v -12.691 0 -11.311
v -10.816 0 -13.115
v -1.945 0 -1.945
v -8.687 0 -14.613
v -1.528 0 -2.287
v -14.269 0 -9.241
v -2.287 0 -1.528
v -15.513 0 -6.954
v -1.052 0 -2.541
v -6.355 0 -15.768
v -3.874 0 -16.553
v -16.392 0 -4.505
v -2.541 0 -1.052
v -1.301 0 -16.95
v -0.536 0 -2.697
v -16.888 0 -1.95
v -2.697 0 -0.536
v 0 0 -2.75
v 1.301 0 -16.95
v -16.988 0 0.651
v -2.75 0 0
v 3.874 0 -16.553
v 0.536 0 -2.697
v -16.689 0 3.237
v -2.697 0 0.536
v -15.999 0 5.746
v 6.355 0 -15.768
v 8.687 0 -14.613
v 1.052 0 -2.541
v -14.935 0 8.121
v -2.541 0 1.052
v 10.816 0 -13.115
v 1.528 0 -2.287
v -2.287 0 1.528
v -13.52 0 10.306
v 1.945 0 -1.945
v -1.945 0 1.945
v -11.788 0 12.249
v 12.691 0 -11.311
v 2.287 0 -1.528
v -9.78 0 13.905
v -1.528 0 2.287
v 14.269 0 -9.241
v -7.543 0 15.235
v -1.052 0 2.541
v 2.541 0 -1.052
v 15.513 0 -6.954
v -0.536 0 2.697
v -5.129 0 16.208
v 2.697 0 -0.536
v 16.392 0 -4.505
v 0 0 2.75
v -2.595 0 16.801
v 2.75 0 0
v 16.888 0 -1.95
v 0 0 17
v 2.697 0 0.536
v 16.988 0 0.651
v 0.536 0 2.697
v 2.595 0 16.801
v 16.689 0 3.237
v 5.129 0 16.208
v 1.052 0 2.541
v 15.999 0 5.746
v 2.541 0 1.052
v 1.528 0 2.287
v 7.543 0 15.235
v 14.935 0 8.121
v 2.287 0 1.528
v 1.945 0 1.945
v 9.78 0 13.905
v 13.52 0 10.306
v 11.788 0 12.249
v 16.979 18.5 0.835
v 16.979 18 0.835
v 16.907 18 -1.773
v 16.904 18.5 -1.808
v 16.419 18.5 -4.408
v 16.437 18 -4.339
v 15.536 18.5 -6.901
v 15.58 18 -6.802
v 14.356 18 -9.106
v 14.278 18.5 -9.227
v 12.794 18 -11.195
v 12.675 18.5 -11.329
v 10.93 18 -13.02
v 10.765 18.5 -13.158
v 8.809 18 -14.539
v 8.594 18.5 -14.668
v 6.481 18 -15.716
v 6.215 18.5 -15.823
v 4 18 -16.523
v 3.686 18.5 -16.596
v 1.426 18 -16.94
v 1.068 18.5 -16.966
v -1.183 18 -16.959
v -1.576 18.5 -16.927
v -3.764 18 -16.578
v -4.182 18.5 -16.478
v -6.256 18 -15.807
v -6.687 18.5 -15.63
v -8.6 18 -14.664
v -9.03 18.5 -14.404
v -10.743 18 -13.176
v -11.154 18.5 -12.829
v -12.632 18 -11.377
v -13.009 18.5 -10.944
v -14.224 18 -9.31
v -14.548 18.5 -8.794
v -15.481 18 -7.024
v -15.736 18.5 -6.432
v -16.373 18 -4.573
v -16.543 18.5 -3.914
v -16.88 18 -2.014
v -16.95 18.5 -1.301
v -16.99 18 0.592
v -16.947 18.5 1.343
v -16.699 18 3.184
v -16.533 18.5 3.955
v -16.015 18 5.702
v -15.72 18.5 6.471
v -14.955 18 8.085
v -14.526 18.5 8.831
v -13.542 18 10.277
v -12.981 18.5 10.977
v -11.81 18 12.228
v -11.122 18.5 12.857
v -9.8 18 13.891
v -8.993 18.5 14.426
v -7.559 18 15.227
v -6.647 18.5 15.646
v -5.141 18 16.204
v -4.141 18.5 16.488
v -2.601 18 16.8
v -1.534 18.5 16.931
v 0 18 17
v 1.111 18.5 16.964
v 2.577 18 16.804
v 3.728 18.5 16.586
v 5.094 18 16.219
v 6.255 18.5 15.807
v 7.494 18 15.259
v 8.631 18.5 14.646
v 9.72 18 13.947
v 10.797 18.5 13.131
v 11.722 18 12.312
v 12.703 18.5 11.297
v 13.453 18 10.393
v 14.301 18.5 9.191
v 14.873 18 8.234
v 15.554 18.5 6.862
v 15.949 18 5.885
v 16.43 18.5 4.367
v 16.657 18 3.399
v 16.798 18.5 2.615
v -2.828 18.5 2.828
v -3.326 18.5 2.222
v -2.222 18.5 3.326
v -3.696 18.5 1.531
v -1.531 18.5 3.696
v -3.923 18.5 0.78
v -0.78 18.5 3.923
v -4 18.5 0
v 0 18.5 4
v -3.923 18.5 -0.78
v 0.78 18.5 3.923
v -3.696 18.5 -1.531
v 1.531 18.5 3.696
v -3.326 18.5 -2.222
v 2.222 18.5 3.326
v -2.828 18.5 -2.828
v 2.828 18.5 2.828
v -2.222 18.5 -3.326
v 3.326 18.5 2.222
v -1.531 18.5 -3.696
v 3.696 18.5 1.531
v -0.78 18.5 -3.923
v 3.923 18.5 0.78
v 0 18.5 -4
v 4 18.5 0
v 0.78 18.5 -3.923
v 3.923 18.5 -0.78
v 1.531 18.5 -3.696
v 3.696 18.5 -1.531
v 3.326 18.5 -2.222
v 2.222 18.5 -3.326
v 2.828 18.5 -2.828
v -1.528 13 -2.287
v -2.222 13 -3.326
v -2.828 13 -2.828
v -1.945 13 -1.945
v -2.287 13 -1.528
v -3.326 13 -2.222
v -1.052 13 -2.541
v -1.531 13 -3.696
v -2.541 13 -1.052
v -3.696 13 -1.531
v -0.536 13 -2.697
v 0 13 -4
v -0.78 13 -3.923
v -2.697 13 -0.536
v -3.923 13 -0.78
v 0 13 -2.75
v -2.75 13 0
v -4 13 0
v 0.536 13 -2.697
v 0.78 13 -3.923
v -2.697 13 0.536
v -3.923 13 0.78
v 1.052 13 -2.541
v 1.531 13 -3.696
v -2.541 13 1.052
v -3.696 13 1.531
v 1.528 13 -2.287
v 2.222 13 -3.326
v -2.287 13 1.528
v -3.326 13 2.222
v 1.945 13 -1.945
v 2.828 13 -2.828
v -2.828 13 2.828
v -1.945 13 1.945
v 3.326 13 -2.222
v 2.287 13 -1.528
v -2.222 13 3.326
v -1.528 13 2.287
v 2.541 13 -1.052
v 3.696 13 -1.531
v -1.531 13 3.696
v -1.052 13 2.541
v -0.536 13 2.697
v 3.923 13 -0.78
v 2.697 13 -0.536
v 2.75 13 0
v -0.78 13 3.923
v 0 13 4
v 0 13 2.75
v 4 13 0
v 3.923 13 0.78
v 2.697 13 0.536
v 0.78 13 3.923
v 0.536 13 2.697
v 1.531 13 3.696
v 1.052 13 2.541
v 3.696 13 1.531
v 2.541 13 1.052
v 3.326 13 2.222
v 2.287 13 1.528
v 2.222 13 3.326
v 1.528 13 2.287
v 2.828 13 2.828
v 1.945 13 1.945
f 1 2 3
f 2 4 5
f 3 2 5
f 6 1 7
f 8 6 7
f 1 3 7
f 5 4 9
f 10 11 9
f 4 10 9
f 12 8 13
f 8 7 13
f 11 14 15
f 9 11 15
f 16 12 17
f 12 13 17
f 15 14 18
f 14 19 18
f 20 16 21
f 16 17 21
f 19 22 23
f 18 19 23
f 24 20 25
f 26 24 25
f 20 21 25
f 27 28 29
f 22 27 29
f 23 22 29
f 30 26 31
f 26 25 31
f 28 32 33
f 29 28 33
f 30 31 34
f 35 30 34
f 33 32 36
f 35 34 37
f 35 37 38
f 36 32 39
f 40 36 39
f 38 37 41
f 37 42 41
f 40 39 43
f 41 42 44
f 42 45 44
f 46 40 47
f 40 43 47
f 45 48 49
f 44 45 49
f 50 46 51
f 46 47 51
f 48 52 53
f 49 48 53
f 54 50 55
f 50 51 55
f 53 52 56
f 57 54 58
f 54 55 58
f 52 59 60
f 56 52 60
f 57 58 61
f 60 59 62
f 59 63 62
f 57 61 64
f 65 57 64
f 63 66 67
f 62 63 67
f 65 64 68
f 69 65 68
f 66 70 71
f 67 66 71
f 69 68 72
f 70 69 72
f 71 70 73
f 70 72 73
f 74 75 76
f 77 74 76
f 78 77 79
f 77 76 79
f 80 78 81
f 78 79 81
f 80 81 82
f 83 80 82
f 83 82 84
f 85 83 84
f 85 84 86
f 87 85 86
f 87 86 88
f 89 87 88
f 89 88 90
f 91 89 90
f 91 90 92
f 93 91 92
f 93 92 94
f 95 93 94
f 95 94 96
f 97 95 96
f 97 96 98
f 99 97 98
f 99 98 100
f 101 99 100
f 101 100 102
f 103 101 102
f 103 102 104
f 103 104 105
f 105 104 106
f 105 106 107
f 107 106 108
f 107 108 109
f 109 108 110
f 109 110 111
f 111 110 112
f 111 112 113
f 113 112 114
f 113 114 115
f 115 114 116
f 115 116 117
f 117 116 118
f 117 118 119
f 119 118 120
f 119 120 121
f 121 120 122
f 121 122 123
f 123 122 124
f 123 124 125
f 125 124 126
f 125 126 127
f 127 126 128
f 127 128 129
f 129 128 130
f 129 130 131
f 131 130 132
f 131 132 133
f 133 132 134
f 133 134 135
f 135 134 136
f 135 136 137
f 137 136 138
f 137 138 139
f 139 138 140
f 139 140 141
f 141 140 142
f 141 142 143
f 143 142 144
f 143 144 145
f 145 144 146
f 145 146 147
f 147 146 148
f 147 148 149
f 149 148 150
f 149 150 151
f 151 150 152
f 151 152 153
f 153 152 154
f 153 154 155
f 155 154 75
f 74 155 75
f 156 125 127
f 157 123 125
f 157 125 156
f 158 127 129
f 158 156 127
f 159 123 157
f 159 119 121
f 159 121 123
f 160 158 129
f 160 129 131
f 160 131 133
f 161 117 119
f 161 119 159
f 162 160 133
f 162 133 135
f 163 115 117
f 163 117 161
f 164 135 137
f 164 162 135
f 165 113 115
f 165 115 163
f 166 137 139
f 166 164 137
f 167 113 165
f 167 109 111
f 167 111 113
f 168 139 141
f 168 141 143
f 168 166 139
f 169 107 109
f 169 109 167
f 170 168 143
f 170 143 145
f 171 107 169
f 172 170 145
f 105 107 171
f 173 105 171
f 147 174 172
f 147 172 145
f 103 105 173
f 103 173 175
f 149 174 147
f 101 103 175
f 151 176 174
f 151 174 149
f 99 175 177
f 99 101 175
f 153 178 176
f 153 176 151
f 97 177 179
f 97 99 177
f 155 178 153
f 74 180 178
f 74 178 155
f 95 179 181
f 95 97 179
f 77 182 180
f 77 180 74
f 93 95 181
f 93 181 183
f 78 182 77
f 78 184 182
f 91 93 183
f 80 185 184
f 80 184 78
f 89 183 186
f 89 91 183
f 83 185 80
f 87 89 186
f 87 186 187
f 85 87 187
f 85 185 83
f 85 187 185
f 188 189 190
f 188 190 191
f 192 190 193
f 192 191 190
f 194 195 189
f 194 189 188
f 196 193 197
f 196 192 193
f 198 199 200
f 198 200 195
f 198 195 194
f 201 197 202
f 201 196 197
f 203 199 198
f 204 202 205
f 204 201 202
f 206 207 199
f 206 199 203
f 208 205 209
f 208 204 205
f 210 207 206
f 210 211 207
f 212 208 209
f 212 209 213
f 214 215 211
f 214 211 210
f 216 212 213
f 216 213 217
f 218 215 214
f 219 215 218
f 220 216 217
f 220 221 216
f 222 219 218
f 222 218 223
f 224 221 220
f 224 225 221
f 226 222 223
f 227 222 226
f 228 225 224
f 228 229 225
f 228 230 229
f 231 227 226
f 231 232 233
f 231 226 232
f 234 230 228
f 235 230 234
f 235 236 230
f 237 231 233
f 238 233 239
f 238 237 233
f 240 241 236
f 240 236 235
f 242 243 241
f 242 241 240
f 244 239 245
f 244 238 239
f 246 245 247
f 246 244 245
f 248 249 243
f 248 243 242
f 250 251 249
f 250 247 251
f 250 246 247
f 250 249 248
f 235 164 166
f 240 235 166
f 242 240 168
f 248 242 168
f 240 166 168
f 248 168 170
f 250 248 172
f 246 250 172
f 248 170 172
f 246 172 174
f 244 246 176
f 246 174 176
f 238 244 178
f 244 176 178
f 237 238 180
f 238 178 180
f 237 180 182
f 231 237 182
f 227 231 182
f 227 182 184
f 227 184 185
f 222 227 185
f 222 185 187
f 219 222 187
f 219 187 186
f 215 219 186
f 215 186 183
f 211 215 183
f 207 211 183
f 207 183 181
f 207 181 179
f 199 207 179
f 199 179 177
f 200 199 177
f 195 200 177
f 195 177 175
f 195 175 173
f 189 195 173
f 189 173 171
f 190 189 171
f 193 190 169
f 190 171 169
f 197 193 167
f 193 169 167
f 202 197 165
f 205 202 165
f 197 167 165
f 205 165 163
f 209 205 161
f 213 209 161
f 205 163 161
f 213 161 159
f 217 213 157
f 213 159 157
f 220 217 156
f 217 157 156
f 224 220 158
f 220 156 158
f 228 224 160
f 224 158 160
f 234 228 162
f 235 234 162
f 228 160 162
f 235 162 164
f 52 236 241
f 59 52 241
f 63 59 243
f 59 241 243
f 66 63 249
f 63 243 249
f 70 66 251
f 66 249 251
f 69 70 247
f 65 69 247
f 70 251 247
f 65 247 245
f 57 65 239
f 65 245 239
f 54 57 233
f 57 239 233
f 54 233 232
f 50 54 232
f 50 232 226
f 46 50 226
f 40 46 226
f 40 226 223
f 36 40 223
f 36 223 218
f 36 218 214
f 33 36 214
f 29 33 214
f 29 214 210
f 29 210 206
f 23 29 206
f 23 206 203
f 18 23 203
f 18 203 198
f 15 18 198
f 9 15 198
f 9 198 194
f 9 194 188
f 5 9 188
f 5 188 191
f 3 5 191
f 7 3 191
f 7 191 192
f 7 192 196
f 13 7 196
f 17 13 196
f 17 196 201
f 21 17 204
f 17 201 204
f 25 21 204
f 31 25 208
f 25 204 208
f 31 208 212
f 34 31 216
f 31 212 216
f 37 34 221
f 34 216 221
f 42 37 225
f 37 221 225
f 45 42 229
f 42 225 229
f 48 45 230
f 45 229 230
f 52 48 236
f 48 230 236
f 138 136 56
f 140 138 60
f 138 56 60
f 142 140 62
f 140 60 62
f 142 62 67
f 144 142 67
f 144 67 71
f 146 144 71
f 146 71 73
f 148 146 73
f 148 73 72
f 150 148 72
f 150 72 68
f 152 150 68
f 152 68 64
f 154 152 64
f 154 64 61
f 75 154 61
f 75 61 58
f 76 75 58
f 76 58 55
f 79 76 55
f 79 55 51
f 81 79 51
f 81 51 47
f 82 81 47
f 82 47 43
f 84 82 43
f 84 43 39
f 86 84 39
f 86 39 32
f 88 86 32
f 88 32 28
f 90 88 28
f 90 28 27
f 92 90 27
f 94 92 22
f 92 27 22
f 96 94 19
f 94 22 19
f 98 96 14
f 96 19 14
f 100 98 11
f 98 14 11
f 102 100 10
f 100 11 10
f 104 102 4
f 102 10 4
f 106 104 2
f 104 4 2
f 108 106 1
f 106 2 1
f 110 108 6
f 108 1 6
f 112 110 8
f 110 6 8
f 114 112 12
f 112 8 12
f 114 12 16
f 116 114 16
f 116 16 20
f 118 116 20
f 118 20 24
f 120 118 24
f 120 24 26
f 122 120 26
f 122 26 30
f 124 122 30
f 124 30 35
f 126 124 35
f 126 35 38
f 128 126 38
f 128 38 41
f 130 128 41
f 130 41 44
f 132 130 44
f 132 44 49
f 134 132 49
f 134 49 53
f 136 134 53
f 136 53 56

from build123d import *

# Parameters (mm, degrees)
SKETCH1_R           = 17
BOSS_EXTRUDE2_DEPTH = 18
SKETCH3_R           = 2.75
CUT_EXTRUDE2_DEPTH  = 64
SKETCH4_R           = 4
CUT_EXTRUDE3_DEPTH  = 5
SKETCH5_RX          = 17
SKETCH5_RY          = 17
BOSS_EXTRUDE3_DEPTH = 0.5
SKETCH6_R           = 4
CUT_EXTRUDE4_DEPTH  = 0.5


with BuildPart() as part:
    # Sketch1 → Boss-Extrude2 (new body)
    with BuildSketch(Plane(origin=(0, 0, 0), x_dir=(1, 0, 0), z_dir=(0, 1, 0))):
        with Locations(Location((0, 0, 0), (0, 0, 270))):
            Circle(SKETCH1_R)
    extrude(amount=BOSS_EXTRUDE2_DEPTH)

    # Sketch3 → Cut-Extrude2 (cut)
    with BuildSketch(Plane(origin=(0, 18, 0), x_dir=(1, 0, 0), z_dir=(0, 1, 0))):
        with Locations(Location((0, 0, 0), (0, 0, 270))):
            Circle(SKETCH3_R)
    extrude(amount=-CUT_EXTRUDE2_DEPTH, mode=Mode.SUBTRACT)

    # Sketch4 → Cut-Extrude3 (cut)
    with BuildSketch(Plane(origin=(0, 18, 0), x_dir=(1, 0, 0), z_dir=(0, 1, 0))):
        with Locations(Location((0, 0, 0), (0, 0, 270))):
            Circle(SKETCH4_R)
    extrude(amount=-CUT_EXTRUDE3_DEPTH, mode=Mode.SUBTRACT)

    # Sketch5 → Boss-Extrude3 (add)
    with BuildSketch(Plane(origin=(0, 18, 0), x_dir=(1, 0, 0), z_dir=(0, 1, 0))):
        with Locations(Location((0, 0), (0, 0, -2.815048359))):
            Ellipse(SKETCH5_RX, SKETCH5_RY)
    extrude(amount=BOSS_EXTRUDE3_DEPTH)

    # Sketch6 → Cut-Extrude4 (cut)
    with BuildSketch(Plane(origin=(0, 18.5, 0), x_dir=(1, 0, 0), z_dir=(0, 1, 0))):
        with Locations(Location((0, 0, 0), (0, 0, 270))):
            Circle(SKETCH6_R)
    extrude(amount=-CUT_EXTRUDE4_DEPTH, mode=Mode.SUBTRACT)


solid = part.part
